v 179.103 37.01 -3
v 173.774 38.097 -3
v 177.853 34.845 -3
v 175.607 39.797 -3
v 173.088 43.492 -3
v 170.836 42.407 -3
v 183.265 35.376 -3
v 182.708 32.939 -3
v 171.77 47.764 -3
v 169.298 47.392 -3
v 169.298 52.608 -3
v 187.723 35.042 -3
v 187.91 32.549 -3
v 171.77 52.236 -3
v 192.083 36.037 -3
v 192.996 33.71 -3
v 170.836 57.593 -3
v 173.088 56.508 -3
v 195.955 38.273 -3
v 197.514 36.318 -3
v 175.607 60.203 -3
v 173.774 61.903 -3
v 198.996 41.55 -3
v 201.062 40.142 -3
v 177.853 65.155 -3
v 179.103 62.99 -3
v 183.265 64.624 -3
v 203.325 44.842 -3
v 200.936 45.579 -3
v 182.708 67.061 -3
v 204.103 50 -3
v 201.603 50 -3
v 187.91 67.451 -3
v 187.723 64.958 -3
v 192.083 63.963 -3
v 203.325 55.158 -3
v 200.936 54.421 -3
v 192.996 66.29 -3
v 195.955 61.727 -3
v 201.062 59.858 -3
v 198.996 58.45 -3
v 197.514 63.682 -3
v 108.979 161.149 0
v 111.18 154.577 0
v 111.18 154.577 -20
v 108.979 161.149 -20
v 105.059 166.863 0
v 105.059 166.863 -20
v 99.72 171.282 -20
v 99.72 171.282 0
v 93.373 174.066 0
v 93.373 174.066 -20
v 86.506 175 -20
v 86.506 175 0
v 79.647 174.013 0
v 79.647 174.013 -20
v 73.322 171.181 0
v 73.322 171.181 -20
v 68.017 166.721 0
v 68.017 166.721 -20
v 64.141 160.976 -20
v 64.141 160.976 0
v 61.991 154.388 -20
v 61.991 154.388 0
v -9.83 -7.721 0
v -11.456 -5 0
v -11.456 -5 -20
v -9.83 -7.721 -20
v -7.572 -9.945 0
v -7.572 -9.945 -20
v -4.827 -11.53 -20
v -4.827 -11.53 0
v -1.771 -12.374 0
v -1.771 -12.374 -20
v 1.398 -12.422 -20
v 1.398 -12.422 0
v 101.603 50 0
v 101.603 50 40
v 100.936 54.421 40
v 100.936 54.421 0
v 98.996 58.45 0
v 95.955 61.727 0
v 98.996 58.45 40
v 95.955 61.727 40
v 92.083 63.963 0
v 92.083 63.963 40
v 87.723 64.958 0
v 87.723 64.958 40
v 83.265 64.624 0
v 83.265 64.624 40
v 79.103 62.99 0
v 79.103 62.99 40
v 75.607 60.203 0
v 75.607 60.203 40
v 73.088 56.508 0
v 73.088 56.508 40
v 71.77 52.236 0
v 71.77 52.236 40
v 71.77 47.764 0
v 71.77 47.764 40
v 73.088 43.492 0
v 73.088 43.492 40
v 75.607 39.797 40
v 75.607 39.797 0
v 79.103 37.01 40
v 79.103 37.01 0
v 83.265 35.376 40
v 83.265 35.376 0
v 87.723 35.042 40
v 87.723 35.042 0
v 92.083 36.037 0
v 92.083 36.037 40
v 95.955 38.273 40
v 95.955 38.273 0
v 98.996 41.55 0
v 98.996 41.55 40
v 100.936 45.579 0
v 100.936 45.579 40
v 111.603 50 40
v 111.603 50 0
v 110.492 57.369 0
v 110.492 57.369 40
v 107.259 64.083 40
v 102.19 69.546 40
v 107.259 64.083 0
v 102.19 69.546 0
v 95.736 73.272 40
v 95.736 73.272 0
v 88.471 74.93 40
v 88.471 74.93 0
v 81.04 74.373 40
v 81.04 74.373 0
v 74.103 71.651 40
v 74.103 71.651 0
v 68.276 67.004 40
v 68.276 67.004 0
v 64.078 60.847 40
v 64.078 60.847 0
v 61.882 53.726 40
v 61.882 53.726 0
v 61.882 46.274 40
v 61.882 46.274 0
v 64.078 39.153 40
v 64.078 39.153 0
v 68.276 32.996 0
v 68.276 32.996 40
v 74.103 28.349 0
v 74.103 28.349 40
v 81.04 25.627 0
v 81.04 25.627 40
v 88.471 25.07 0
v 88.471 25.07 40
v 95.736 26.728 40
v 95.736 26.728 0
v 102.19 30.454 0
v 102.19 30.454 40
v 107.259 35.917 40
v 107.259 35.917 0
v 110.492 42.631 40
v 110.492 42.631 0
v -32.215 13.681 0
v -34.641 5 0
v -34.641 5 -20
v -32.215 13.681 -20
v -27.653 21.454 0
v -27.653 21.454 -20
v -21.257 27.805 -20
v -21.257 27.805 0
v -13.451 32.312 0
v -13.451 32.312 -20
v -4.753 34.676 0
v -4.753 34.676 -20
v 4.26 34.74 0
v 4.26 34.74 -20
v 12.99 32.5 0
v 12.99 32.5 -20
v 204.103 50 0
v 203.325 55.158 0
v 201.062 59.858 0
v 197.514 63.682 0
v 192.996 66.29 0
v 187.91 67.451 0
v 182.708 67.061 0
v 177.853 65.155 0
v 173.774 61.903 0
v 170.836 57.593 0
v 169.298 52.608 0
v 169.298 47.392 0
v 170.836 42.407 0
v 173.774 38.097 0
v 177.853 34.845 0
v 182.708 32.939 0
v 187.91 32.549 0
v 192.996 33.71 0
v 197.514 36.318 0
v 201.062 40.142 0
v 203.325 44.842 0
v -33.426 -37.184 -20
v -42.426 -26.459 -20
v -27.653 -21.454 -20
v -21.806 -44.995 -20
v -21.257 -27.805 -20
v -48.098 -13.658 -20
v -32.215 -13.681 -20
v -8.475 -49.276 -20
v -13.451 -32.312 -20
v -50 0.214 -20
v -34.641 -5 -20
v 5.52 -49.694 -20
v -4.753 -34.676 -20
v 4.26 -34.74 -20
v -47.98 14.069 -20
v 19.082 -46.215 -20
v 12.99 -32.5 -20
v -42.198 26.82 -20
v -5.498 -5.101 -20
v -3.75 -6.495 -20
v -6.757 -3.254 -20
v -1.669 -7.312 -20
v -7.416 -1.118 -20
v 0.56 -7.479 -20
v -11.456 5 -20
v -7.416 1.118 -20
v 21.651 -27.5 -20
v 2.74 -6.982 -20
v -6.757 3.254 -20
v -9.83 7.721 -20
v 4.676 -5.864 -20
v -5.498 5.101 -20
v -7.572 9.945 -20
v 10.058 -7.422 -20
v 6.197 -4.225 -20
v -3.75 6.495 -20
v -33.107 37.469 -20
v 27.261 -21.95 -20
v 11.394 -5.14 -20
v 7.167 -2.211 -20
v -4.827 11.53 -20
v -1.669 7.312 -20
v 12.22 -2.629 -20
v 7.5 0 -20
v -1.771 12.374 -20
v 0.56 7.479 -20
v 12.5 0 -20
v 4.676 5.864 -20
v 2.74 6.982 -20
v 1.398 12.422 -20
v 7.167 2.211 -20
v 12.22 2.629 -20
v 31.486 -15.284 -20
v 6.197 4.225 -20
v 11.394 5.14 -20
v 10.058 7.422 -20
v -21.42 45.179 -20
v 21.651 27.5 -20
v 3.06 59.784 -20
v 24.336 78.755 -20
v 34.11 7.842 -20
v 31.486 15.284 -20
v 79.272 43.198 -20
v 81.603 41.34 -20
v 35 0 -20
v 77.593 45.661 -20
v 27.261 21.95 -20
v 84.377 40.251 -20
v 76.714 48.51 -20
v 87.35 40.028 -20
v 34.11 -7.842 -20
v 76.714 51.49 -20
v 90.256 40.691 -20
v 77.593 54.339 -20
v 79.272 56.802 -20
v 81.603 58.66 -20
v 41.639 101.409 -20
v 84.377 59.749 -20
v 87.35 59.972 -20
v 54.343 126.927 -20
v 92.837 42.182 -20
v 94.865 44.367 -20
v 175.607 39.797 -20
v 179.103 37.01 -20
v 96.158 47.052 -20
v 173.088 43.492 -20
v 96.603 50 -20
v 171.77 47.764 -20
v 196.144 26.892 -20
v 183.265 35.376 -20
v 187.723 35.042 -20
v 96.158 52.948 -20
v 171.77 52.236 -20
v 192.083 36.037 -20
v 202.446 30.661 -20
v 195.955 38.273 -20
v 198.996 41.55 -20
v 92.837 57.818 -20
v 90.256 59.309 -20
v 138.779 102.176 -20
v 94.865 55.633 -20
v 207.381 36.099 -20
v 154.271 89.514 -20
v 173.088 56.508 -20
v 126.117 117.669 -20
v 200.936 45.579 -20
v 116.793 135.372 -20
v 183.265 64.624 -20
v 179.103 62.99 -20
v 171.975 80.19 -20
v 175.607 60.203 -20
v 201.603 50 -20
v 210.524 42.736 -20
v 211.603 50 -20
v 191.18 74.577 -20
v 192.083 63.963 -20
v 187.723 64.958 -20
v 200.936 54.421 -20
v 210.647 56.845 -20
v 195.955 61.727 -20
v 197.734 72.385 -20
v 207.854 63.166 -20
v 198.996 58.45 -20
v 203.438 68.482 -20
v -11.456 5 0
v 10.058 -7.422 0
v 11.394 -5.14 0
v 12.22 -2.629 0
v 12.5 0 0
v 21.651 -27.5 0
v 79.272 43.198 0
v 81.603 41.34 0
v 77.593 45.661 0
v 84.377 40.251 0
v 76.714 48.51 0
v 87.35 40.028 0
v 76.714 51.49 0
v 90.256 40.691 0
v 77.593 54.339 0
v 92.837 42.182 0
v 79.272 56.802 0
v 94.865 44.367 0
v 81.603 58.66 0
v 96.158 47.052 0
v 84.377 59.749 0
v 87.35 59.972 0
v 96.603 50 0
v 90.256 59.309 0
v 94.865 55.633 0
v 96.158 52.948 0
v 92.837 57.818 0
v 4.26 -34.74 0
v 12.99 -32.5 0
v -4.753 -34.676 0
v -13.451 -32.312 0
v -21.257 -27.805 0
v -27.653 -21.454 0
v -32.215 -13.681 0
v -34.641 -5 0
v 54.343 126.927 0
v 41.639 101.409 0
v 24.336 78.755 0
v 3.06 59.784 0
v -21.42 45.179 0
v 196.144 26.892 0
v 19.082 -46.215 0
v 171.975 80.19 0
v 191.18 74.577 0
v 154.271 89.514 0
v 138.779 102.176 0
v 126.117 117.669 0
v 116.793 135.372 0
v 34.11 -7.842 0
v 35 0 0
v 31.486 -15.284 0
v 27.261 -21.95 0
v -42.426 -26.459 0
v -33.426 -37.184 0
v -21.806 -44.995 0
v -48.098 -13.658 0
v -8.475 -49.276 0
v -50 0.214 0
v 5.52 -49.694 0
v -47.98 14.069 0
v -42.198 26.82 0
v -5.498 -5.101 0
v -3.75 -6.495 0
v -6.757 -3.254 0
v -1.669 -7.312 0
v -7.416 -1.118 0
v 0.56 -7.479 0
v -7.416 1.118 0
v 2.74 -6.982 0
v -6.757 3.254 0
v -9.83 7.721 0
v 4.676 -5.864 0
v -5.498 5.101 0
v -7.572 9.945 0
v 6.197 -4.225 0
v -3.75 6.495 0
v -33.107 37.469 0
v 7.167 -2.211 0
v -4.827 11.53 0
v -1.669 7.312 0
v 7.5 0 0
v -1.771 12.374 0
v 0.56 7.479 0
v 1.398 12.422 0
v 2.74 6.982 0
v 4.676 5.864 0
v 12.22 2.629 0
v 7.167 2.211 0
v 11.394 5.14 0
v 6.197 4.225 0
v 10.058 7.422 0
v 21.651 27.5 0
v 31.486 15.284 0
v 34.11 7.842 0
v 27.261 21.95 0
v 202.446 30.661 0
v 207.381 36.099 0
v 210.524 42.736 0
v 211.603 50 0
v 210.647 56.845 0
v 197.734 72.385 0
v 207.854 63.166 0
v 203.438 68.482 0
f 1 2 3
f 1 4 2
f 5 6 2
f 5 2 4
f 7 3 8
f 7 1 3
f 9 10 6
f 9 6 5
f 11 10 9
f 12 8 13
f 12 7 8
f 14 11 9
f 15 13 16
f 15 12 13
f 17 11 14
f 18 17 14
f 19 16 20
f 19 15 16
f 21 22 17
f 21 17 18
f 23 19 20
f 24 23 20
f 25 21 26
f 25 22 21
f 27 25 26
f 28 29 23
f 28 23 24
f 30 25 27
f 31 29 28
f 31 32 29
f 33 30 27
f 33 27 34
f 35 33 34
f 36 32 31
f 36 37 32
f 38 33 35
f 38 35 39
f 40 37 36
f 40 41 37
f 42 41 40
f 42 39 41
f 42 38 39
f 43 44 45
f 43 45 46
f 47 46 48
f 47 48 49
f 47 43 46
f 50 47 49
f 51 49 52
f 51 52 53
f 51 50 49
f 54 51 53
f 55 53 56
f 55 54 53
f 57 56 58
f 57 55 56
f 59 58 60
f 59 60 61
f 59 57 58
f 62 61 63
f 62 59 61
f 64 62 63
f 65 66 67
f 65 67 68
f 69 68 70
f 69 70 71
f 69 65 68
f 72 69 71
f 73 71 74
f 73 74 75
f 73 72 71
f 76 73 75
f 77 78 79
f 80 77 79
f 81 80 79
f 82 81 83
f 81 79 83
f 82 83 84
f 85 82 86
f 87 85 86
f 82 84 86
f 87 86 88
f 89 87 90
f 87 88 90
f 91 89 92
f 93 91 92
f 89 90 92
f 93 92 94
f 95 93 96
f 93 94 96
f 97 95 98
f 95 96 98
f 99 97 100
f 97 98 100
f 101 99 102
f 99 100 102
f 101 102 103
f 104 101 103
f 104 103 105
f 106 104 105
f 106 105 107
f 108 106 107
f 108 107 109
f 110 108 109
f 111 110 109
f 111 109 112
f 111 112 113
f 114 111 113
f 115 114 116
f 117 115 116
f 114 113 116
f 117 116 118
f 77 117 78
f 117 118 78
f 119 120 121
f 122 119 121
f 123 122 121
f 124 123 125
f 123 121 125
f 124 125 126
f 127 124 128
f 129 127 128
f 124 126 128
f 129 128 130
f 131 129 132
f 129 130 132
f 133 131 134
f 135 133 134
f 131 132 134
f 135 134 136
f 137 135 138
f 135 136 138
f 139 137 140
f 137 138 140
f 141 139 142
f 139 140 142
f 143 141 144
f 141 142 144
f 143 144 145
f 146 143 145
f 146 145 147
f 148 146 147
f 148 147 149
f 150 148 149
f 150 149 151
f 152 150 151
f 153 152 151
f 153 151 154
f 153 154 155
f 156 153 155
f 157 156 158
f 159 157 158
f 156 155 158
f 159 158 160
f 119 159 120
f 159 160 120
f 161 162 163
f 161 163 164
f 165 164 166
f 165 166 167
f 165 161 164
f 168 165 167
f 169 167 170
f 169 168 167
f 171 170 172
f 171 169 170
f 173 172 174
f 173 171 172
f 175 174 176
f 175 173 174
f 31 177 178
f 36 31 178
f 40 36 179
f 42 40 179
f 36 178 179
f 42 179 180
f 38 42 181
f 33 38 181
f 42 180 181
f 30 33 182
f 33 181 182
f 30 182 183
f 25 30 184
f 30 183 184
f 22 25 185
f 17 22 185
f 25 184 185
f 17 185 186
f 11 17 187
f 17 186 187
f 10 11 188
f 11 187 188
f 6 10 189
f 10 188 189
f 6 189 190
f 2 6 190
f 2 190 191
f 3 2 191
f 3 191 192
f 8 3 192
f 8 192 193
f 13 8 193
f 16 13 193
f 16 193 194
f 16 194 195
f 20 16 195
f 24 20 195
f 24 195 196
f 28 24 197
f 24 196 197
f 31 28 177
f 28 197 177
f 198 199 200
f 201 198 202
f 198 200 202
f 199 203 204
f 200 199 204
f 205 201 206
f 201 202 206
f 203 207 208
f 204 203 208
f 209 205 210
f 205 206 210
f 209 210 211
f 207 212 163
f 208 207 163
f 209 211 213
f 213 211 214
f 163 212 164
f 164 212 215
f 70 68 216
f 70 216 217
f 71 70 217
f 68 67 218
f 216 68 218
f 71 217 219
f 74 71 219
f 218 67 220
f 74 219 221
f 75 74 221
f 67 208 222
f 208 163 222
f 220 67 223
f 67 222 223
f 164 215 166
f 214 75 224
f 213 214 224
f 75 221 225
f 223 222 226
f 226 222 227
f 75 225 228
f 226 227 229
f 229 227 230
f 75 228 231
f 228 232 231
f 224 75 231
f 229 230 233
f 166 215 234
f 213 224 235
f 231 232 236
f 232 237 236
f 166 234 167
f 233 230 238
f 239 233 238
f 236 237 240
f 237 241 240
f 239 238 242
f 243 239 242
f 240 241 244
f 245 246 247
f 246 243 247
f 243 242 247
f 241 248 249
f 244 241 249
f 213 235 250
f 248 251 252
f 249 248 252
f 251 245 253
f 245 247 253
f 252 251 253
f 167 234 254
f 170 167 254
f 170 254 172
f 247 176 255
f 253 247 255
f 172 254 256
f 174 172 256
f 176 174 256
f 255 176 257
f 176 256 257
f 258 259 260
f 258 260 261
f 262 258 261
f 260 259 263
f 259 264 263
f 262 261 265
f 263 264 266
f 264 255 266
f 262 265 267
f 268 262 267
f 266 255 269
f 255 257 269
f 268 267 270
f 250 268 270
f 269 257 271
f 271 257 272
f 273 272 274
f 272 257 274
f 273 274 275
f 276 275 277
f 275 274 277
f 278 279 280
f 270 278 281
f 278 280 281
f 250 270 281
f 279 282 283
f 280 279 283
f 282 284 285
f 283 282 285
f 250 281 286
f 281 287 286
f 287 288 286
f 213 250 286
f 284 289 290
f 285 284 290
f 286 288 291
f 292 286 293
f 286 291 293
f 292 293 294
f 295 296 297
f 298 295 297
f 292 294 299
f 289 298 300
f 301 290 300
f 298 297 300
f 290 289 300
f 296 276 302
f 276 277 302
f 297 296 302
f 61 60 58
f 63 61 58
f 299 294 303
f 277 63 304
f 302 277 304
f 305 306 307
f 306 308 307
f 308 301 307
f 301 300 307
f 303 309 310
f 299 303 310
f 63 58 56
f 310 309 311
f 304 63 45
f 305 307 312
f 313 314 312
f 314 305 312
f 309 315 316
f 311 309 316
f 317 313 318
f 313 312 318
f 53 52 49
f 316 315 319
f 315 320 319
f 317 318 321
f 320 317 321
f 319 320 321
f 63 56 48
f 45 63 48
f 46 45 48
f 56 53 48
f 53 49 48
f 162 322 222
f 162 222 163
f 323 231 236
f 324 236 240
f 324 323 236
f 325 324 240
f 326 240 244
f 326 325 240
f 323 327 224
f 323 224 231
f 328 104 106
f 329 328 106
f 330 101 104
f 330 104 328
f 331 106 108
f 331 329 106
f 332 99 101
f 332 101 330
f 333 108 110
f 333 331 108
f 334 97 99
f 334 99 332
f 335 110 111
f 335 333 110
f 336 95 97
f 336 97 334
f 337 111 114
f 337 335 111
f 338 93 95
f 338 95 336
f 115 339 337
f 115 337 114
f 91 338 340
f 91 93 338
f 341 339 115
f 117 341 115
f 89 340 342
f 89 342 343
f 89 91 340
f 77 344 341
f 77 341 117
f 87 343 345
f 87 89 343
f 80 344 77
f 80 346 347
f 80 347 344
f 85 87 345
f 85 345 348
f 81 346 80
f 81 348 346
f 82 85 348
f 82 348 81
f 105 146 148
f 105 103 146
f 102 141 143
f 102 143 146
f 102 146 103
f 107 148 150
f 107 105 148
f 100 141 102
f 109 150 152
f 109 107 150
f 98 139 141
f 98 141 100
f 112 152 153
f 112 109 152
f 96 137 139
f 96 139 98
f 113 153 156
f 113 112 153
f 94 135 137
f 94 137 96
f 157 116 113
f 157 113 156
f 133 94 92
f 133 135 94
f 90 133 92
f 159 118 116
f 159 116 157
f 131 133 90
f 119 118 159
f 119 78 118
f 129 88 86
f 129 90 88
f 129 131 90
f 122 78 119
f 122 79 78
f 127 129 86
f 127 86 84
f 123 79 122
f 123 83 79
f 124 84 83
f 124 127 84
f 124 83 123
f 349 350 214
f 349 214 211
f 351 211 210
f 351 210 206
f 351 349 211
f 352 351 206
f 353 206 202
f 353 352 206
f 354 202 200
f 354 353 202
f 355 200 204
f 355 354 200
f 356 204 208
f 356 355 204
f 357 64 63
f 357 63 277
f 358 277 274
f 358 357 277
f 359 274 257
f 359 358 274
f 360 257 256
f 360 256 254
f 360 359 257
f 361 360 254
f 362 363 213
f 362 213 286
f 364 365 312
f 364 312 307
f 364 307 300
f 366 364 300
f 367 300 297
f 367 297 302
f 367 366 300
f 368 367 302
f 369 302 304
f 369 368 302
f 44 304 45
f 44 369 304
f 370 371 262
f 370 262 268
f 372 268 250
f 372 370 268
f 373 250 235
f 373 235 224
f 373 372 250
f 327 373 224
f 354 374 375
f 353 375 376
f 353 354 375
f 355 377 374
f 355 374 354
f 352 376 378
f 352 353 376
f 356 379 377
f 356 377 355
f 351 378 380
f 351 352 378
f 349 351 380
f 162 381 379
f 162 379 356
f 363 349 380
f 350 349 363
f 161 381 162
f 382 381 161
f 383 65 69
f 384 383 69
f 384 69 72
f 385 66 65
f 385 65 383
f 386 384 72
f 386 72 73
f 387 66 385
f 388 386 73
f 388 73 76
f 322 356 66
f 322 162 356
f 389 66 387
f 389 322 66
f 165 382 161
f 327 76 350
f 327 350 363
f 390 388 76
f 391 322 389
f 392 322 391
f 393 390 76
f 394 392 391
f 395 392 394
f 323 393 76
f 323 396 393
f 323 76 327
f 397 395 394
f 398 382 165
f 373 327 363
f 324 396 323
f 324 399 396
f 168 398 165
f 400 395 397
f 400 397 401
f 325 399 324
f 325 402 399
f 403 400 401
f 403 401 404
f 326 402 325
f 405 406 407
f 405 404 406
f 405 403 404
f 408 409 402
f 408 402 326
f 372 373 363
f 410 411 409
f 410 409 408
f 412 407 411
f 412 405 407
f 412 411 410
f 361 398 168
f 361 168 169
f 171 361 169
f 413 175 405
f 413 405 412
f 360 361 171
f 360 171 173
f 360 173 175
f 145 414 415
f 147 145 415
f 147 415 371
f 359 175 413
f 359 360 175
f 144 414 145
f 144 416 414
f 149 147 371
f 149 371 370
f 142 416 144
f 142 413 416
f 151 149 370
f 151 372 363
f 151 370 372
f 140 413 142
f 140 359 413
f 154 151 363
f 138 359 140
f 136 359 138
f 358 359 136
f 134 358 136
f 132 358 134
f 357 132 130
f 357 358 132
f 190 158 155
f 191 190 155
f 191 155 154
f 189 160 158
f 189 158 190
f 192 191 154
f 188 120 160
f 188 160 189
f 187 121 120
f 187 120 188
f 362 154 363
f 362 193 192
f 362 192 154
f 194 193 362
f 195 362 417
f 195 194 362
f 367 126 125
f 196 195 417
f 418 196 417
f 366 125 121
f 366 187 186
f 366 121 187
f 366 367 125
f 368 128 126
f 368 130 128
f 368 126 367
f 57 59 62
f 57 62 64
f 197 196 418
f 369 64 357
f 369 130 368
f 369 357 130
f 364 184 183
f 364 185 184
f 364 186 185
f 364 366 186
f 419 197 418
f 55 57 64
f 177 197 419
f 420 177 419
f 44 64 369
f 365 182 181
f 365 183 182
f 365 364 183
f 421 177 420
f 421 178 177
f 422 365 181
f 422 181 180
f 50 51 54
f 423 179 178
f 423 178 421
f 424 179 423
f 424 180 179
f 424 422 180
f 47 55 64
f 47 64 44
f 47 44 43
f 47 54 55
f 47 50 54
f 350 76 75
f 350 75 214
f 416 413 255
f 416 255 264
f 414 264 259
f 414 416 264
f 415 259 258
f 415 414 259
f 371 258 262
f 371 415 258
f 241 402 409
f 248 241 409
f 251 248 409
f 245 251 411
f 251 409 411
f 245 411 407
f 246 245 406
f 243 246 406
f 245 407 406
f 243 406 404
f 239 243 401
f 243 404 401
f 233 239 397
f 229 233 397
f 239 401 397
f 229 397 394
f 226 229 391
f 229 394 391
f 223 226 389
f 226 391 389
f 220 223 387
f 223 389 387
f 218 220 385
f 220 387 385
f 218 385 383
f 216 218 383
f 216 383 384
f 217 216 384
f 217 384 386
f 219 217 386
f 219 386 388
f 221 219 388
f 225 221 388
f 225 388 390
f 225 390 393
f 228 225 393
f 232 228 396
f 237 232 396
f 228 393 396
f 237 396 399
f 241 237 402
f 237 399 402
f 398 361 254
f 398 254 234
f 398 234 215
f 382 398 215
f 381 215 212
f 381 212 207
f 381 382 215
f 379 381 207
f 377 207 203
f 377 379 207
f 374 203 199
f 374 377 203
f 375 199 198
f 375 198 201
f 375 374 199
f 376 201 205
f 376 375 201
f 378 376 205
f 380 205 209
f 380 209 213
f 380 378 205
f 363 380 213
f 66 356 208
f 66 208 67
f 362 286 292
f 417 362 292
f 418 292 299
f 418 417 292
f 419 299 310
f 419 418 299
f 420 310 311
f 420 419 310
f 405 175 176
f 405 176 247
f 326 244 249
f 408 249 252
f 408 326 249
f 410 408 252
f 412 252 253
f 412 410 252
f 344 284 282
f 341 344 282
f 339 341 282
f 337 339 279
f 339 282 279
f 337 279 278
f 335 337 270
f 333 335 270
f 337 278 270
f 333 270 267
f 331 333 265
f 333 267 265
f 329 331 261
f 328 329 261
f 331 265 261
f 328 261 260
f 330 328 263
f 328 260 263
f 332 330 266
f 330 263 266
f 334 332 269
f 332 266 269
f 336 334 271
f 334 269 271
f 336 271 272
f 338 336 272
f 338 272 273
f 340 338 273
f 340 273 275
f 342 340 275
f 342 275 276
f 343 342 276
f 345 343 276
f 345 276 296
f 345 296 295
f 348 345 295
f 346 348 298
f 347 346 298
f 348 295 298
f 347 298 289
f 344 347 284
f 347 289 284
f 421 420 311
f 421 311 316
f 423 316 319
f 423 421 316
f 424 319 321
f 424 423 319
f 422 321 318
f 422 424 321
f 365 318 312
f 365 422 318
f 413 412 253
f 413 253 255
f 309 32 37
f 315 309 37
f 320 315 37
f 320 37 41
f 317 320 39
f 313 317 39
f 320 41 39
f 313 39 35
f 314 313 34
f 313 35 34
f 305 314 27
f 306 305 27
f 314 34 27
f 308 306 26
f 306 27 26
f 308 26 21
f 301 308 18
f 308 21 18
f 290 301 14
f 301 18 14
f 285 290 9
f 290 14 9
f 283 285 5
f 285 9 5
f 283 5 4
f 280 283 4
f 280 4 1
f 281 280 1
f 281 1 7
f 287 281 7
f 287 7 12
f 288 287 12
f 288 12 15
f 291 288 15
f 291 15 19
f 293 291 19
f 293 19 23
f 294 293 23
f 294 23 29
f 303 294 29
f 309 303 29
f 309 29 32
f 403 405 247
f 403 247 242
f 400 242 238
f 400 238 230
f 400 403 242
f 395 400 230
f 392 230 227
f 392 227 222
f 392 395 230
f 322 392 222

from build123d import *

# Parameters (mm, degrees)
F0_R      = 25
F0_R_2    = 17.5
F0_R_3    = 7.5
F1_DEPTH  = 20
F2_DEPTH  = 40
F3_R      = 15
F4_DEPTH  = 40
F5_R      = 10
F6_DEPTH  = 20
F7_R      = 15
F8_DEPTH  = 20.001
F9_R      = 17.5
F10_DEPTH = 3


with BuildPart() as f1:
    # F0 (on Top) → F1 (new body)
    with BuildSketch(Plane.XY):
        with BuildLine():
            ThreePointArc((61.9906852191, 154.3882326301), (33.5268459232, 89.6702692228), (-21.4201114342, 45.1794071026))
            ThreePointArc((-21.4201114342, 45.1794071026), (-45.7124014002, -20.2577481036), (19.0821348166, -46.2154966525))
            Line((19.0821348166, -46.2154966525), (196.1436077868, 26.8922516737))
            ThreePointArc((196.1436077868, 26.8922516737), (161.7368914415, 47.4116601952), (191.1799201156, 74.5773797371))
            ThreePointArc((191.1799201156, 74.5773797371), (138.7787609454, 102.1762205669), (111.1799201156, 154.5773797371))
            ThreePointArc((111.1799201156, 154.5773797371), (111.4966611043, 152.2984240875), (111.6025403784, 150))
            ThreePointArc((111.6025403784, 150), (84.3998578075, 125.0972252652), (61.9906852191, 154.3882326301))
        make_face()
        with BuildLine():
            ThreePointArc((21.6506350946, 27.5), (31.4862845403, 15.2844327943), (35, 0))
            ThreePointArc((35, 0), (31.4862845403, -15.2844327943), (21.6506350946, -27.5))
            ThreePointArc((21.6506350946, -27.5), (17.5, -30.3108891325), (12.9903810568, -32.5))
            ThreePointArc((12.9903810568, -32.5), (-17.5, -30.3108891325), (-34.6410161514, -5))
            ThreePointArc((-34.6410161514, -5), (-35, 0), (-34.6410161514, 5))
            ThreePointArc((-34.6410161514, 5), (-17.5, 30.3108891325), (12.9903810568, 32.5))
            ThreePointArc((12.9903810568, 32.5), (17.5, 30.3108891325), (21.6506350946, 27.5))
        make_face(mode=Mode.SUBTRACT)
        with Locations((86.6025403784, 50)):
            Circle(F0_R, mode=Mode.SUBTRACT)
        with BuildLine():
            ThreePointArc((191.1799201156, 74.5773797371), (161.7368914415, 47.4116601952), (196.1436077868, 26.8922516737))
            ThreePointArc((196.1436077868, 26.8922516737), (207.3814561972, 36.0990411339), (211.6025403784, 50))
            ThreePointArc((211.6025403784, 50), (205.8305732137, 65.9775703186), (191.1799201156, 74.5773797371))
        make_face()
        with Locations((186.6025403784, 50)):
            Circle(F0_R_2, mode=Mode.SUBTRACT)
        with BuildLine():
            ThreePointArc((111.1799201156, 154.5773797371), (86.5064087202, 174.9998151734), (61.9906852191, 154.3882326301))
            ThreePointArc((61.9906852191, 154.3882326301), (84.3998578075, 125.0972252652), (111.6025403784, 150))
            ThreePointArc((111.6025403784, 150), (111.4966611043, 152.2984240875), (111.1799201156, 154.5773797371))
        make_face()
        with Locations((86.6025403784, 150)):
            Circle(F0_R_2, mode=Mode.SUBTRACT)
        with Locations((86.6025403784, 50)):
            Circle(F0_R)
        with Locations((186.6025403784, 50)):
            Circle(F0_R_2)
        with Locations((86.6025403784, 150)):
            Circle(F0_R_2)
        with BuildLine():
            ThreePointArc((12.5, 0), (11.8739069596, 3.9064476849), (10.0583466376, 7.4215674165))
            ThreePointArc((10.0583466376, 7.4215674165), (6.25, 10.8253175473), (1.3980925998, 12.4215674165))
            ThreePointArc((1.3980925998, 12.4215674165), (-6.25, 10.8253175473), (-11.4564392374, 5))
            ThreePointArc((-11.4564392374, 5), (-12.5, 0), (-11.4564392374, -5))
            ThreePointArc((-11.4564392374, -5), (-6.25, -10.8253175473), (1.3980925998, -12.4215674165))
            ThreePointArc((1.3980925998, -12.4215674165), (6.25, -10.8253175473), (10.0583466376, -7.4215674165))
            ThreePointArc((10.0583466376, -7.4215674165), (11.8739069596, -3.9064476849), (12.5, 0))
        make_face()
        Circle(F0_R_3, mode=Mode.SUBTRACT)
        with BuildLine():
            Line((10.0583466376, 7.4215674165), (21.6506350946, 27.5))
            ThreePointArc((21.6506350946, 27.5), (17.5, 30.3108891325), (12.9903810568, 32.5))
            Line((12.9903810568, 32.5), (1.3980925998, 12.4215674165))
            ThreePointArc((1.3980925998, 12.4215674165), (6.25, 10.8253175473), (10.0583466376, 7.4215674165))
        make_face()
        with BuildLine():
            Line((-11.4564392374, 5), (-34.6410161514, 5))
            ThreePointArc((-34.6410161514, 5), (-35, 0), (-34.6410161514, -5))
            Line((-34.6410161514, -5), (-11.4564392374, -5))
            ThreePointArc((-11.4564392374, -5), (-12.5, 0), (-11.4564392374, 5))
        make_face()
        with BuildLine():
            ThreePointArc((12.9903810568, -32.5), (17.5, -30.3108891325), (21.6506350946, -27.5))
            Line((21.6506350946, -27.5), (10.0583466376, -7.4215674165))
            ThreePointArc((10.0583466376, -7.4215674165), (6.25, -10.8253175473), (1.3980925998, -12.4215674165))
            Line((1.3980925998, -12.4215674165), (12.9903810568, -32.5))
        make_face()
    extrude(amount=-F1_DEPTH)

    # F0 (on Top) → F2 (join)
    with BuildSketch(Plane.XY):
        with Locations((86.6025403784, 50)):
            Circle(F0_R)
    extrude(amount=F2_DEPTH)

    # F3 (on face) → F4 (cut, through all)
    with BuildSketch(Plane.XY.offset(40)):
        with Locations((86.6025403784, 50)):
            Circle(F3_R)
    extrude(amount=-F4_DEPTH, mode=Mode.SUBTRACT)

    # F5 (on face) → F6 (cut, through all)
    with BuildSketch(Plane(origin=(0, 0, -20), x_dir=(1, 0, 0), z_dir=(0, 0, -1))):
        with Locations((86.6025403784, -50)):
            Circle(F5_R)
    extrude(amount=-F6_DEPTH, mode=Mode.SUBTRACT)

    # F7 (on face) → F8 (cut, through all)
    with BuildSketch(Plane.XY):
        with Locations((186.6025403784, 50)):
            Circle(F7_R)
    extrude(amount=-F8_DEPTH, mode=Mode.SUBTRACT)

    # F9 (on face) → F10 (cut)
    with BuildSketch(Plane.XY):
        with Locations((186.6025403784, 50)):
            Circle(F9_R)
    extrude(amount=-F10_DEPTH, mode=Mode.SUBTRACT)


solid = f1.part
